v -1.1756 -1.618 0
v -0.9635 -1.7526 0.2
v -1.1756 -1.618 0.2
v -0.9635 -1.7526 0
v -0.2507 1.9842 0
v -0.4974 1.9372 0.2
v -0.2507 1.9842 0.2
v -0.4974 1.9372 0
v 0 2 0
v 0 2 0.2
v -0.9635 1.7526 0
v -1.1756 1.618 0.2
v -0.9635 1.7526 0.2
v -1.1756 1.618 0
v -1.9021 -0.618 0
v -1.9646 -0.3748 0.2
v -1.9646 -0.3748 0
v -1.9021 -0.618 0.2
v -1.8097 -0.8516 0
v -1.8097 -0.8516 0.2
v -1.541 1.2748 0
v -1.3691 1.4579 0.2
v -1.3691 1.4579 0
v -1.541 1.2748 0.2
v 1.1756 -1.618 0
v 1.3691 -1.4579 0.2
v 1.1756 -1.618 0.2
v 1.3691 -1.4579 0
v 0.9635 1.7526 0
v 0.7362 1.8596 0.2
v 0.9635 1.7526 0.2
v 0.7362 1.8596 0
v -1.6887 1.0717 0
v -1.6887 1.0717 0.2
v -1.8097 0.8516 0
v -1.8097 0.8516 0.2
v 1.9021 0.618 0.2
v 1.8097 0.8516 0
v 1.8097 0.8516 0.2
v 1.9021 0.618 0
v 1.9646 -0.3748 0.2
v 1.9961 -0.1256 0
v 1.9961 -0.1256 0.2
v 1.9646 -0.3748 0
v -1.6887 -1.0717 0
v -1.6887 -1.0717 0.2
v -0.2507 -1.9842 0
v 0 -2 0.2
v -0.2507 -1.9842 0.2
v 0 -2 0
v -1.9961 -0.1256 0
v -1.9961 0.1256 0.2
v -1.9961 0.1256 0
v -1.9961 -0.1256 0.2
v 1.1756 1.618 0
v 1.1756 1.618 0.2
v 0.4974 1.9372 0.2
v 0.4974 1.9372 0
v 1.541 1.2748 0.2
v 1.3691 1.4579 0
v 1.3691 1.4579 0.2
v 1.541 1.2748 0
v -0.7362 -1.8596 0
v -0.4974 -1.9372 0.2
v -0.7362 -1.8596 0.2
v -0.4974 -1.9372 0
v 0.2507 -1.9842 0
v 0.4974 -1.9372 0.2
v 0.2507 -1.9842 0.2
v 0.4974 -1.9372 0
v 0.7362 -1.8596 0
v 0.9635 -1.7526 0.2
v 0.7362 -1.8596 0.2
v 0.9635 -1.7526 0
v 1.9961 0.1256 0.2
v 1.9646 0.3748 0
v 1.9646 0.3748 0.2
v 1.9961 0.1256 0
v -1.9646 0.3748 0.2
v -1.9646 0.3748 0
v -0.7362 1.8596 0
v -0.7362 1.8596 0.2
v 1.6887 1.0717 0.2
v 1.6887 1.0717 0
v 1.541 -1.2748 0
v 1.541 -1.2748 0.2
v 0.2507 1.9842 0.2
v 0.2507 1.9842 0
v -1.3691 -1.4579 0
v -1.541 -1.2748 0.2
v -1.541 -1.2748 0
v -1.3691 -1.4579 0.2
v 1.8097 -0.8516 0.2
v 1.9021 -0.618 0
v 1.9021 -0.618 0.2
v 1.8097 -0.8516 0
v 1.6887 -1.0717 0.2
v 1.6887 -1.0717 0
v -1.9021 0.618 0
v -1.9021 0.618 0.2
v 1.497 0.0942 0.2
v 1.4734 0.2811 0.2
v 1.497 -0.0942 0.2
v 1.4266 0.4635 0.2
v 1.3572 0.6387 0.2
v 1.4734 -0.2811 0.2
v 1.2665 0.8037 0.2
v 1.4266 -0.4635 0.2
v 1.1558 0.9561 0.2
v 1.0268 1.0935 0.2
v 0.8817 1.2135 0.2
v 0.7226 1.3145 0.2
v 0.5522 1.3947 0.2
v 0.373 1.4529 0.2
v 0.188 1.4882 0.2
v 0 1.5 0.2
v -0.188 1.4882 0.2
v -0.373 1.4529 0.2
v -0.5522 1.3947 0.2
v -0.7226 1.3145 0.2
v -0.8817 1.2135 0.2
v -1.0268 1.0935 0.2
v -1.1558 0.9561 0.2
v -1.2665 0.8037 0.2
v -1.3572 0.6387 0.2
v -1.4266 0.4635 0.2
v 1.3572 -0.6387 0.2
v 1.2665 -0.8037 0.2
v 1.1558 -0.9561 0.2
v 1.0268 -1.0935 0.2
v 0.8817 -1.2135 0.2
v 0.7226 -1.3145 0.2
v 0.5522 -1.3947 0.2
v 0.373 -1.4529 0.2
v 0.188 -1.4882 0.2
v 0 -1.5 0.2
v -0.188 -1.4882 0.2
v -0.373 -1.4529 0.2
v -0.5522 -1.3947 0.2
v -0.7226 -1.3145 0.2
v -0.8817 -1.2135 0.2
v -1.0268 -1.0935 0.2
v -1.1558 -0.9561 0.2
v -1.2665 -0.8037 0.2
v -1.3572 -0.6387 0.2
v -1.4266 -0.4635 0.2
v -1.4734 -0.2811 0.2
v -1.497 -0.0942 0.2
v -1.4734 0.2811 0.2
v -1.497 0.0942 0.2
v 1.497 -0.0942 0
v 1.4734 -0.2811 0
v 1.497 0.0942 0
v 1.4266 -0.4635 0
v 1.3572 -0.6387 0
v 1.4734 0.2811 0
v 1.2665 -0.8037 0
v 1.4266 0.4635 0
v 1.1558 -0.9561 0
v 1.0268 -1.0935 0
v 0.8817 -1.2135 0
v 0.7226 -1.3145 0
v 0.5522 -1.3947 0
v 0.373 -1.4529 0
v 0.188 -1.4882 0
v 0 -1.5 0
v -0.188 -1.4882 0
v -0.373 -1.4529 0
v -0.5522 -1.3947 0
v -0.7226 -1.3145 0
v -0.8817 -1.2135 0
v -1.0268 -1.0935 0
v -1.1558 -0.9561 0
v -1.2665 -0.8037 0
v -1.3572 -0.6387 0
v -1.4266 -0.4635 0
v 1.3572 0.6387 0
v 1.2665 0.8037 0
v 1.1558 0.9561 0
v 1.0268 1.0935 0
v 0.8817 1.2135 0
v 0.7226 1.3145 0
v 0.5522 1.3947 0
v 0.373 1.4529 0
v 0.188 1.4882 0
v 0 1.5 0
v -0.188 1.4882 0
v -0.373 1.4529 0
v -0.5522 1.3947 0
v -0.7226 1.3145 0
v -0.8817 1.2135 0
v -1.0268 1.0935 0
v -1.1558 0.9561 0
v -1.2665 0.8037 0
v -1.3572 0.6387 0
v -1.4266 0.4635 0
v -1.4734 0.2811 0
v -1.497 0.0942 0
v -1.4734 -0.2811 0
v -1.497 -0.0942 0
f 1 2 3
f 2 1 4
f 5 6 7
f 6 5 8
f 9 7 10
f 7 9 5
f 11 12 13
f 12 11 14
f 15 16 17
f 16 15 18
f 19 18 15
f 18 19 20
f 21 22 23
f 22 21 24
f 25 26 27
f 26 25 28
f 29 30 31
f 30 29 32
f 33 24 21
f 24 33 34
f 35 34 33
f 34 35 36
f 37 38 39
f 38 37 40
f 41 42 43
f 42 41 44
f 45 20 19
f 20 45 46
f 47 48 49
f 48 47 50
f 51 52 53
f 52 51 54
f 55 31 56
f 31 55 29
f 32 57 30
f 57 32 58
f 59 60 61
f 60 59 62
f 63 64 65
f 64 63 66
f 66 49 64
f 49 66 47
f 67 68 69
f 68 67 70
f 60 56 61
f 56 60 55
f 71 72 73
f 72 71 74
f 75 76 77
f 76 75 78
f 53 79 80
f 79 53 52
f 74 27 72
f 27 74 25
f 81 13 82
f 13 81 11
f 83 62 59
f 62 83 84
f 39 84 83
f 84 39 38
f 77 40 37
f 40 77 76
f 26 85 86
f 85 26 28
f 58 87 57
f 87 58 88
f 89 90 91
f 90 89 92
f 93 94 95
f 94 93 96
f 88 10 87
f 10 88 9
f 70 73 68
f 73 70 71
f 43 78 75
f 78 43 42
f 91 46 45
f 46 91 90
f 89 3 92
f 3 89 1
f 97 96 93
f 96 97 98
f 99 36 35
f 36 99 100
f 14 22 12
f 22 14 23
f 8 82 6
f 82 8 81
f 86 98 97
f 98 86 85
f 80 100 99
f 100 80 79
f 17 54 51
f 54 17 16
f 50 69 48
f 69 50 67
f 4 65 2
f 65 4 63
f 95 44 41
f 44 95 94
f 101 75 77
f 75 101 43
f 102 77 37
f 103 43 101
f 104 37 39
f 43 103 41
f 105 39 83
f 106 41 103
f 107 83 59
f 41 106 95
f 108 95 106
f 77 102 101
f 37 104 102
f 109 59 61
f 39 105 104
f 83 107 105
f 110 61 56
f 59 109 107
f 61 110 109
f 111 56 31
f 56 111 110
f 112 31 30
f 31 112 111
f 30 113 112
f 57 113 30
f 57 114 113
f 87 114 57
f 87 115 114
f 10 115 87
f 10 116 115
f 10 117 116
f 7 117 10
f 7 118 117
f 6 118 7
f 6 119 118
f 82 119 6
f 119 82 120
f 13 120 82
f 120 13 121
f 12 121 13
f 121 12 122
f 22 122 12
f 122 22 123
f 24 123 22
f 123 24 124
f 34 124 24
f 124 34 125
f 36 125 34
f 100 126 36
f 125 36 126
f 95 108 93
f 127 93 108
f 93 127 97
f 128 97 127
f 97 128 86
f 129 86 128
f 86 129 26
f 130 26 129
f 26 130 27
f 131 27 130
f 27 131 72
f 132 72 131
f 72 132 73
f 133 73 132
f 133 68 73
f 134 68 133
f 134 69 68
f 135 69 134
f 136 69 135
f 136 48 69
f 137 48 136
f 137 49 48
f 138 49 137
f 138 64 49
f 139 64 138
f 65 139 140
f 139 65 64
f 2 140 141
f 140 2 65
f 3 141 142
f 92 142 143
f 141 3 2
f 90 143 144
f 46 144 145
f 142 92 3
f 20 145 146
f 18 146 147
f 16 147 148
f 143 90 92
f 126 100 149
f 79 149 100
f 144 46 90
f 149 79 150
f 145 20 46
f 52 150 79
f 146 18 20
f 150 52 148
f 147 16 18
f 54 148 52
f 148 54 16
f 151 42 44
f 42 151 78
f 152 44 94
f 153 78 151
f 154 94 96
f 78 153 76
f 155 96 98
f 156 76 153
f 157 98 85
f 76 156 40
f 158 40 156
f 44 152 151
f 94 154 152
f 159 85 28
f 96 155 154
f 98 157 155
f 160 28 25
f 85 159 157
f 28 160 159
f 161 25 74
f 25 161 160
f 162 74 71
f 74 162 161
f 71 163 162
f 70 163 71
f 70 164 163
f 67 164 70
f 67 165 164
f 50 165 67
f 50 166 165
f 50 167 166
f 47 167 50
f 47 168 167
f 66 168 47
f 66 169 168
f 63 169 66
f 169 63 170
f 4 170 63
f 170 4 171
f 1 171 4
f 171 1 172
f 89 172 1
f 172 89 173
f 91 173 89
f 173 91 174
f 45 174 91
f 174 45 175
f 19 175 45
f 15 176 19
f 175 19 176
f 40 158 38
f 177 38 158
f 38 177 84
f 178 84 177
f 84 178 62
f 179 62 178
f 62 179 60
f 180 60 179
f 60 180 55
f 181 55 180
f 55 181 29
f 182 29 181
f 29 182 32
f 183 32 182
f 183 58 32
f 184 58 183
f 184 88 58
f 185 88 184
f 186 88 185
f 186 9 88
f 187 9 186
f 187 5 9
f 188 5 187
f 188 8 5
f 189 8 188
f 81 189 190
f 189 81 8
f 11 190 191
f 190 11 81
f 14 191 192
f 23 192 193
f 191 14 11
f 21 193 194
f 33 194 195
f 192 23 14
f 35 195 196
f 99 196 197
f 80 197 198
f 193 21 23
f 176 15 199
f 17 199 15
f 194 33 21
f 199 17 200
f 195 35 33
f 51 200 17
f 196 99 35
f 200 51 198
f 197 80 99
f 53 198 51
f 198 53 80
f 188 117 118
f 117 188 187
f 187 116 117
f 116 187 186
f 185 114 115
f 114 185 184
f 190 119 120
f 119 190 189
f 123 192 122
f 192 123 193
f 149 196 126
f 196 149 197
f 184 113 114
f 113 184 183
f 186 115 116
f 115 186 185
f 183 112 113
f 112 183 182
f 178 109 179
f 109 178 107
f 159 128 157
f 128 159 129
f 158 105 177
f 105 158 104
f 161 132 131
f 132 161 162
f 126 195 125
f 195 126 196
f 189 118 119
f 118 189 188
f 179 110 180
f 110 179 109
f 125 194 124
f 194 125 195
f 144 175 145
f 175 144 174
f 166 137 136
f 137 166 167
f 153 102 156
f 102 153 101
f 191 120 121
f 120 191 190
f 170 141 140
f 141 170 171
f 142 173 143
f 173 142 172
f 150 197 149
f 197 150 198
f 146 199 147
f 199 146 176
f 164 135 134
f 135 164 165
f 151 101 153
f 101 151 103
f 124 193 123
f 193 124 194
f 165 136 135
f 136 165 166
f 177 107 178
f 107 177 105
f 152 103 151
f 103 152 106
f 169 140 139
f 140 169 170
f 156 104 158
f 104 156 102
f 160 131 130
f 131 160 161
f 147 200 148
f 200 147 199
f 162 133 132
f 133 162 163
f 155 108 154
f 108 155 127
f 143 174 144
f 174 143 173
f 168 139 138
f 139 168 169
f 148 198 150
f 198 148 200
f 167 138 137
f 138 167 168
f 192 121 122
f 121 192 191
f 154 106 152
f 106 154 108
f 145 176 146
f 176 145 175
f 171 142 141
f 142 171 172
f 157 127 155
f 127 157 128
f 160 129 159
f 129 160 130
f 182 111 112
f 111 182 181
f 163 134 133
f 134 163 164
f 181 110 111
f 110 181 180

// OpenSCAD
/*// carriage M3 washers for levelling the TronXY P802MA
// Print 50 of these (some will be bad) at 0.2 layer height with first layer at 0.2mm if you have good enough alignment, or change h below to match.
// These are very small, let your bed cool before removing.*/
difference(){
translate([0,0,0])
    rotate(a=[0,0,90])cylinder(r=2,h=0.2,$fn=50); /*outer diameter - change r for radius of outside diameter - change h for z axis height of washers.*/
translate([0,0,-1])
    rotate(a=[0,0,90])cylinder(r=1.5,h=4,$fn=50); /*hole for the bolt - change r for radius of inside diameter*/
}
